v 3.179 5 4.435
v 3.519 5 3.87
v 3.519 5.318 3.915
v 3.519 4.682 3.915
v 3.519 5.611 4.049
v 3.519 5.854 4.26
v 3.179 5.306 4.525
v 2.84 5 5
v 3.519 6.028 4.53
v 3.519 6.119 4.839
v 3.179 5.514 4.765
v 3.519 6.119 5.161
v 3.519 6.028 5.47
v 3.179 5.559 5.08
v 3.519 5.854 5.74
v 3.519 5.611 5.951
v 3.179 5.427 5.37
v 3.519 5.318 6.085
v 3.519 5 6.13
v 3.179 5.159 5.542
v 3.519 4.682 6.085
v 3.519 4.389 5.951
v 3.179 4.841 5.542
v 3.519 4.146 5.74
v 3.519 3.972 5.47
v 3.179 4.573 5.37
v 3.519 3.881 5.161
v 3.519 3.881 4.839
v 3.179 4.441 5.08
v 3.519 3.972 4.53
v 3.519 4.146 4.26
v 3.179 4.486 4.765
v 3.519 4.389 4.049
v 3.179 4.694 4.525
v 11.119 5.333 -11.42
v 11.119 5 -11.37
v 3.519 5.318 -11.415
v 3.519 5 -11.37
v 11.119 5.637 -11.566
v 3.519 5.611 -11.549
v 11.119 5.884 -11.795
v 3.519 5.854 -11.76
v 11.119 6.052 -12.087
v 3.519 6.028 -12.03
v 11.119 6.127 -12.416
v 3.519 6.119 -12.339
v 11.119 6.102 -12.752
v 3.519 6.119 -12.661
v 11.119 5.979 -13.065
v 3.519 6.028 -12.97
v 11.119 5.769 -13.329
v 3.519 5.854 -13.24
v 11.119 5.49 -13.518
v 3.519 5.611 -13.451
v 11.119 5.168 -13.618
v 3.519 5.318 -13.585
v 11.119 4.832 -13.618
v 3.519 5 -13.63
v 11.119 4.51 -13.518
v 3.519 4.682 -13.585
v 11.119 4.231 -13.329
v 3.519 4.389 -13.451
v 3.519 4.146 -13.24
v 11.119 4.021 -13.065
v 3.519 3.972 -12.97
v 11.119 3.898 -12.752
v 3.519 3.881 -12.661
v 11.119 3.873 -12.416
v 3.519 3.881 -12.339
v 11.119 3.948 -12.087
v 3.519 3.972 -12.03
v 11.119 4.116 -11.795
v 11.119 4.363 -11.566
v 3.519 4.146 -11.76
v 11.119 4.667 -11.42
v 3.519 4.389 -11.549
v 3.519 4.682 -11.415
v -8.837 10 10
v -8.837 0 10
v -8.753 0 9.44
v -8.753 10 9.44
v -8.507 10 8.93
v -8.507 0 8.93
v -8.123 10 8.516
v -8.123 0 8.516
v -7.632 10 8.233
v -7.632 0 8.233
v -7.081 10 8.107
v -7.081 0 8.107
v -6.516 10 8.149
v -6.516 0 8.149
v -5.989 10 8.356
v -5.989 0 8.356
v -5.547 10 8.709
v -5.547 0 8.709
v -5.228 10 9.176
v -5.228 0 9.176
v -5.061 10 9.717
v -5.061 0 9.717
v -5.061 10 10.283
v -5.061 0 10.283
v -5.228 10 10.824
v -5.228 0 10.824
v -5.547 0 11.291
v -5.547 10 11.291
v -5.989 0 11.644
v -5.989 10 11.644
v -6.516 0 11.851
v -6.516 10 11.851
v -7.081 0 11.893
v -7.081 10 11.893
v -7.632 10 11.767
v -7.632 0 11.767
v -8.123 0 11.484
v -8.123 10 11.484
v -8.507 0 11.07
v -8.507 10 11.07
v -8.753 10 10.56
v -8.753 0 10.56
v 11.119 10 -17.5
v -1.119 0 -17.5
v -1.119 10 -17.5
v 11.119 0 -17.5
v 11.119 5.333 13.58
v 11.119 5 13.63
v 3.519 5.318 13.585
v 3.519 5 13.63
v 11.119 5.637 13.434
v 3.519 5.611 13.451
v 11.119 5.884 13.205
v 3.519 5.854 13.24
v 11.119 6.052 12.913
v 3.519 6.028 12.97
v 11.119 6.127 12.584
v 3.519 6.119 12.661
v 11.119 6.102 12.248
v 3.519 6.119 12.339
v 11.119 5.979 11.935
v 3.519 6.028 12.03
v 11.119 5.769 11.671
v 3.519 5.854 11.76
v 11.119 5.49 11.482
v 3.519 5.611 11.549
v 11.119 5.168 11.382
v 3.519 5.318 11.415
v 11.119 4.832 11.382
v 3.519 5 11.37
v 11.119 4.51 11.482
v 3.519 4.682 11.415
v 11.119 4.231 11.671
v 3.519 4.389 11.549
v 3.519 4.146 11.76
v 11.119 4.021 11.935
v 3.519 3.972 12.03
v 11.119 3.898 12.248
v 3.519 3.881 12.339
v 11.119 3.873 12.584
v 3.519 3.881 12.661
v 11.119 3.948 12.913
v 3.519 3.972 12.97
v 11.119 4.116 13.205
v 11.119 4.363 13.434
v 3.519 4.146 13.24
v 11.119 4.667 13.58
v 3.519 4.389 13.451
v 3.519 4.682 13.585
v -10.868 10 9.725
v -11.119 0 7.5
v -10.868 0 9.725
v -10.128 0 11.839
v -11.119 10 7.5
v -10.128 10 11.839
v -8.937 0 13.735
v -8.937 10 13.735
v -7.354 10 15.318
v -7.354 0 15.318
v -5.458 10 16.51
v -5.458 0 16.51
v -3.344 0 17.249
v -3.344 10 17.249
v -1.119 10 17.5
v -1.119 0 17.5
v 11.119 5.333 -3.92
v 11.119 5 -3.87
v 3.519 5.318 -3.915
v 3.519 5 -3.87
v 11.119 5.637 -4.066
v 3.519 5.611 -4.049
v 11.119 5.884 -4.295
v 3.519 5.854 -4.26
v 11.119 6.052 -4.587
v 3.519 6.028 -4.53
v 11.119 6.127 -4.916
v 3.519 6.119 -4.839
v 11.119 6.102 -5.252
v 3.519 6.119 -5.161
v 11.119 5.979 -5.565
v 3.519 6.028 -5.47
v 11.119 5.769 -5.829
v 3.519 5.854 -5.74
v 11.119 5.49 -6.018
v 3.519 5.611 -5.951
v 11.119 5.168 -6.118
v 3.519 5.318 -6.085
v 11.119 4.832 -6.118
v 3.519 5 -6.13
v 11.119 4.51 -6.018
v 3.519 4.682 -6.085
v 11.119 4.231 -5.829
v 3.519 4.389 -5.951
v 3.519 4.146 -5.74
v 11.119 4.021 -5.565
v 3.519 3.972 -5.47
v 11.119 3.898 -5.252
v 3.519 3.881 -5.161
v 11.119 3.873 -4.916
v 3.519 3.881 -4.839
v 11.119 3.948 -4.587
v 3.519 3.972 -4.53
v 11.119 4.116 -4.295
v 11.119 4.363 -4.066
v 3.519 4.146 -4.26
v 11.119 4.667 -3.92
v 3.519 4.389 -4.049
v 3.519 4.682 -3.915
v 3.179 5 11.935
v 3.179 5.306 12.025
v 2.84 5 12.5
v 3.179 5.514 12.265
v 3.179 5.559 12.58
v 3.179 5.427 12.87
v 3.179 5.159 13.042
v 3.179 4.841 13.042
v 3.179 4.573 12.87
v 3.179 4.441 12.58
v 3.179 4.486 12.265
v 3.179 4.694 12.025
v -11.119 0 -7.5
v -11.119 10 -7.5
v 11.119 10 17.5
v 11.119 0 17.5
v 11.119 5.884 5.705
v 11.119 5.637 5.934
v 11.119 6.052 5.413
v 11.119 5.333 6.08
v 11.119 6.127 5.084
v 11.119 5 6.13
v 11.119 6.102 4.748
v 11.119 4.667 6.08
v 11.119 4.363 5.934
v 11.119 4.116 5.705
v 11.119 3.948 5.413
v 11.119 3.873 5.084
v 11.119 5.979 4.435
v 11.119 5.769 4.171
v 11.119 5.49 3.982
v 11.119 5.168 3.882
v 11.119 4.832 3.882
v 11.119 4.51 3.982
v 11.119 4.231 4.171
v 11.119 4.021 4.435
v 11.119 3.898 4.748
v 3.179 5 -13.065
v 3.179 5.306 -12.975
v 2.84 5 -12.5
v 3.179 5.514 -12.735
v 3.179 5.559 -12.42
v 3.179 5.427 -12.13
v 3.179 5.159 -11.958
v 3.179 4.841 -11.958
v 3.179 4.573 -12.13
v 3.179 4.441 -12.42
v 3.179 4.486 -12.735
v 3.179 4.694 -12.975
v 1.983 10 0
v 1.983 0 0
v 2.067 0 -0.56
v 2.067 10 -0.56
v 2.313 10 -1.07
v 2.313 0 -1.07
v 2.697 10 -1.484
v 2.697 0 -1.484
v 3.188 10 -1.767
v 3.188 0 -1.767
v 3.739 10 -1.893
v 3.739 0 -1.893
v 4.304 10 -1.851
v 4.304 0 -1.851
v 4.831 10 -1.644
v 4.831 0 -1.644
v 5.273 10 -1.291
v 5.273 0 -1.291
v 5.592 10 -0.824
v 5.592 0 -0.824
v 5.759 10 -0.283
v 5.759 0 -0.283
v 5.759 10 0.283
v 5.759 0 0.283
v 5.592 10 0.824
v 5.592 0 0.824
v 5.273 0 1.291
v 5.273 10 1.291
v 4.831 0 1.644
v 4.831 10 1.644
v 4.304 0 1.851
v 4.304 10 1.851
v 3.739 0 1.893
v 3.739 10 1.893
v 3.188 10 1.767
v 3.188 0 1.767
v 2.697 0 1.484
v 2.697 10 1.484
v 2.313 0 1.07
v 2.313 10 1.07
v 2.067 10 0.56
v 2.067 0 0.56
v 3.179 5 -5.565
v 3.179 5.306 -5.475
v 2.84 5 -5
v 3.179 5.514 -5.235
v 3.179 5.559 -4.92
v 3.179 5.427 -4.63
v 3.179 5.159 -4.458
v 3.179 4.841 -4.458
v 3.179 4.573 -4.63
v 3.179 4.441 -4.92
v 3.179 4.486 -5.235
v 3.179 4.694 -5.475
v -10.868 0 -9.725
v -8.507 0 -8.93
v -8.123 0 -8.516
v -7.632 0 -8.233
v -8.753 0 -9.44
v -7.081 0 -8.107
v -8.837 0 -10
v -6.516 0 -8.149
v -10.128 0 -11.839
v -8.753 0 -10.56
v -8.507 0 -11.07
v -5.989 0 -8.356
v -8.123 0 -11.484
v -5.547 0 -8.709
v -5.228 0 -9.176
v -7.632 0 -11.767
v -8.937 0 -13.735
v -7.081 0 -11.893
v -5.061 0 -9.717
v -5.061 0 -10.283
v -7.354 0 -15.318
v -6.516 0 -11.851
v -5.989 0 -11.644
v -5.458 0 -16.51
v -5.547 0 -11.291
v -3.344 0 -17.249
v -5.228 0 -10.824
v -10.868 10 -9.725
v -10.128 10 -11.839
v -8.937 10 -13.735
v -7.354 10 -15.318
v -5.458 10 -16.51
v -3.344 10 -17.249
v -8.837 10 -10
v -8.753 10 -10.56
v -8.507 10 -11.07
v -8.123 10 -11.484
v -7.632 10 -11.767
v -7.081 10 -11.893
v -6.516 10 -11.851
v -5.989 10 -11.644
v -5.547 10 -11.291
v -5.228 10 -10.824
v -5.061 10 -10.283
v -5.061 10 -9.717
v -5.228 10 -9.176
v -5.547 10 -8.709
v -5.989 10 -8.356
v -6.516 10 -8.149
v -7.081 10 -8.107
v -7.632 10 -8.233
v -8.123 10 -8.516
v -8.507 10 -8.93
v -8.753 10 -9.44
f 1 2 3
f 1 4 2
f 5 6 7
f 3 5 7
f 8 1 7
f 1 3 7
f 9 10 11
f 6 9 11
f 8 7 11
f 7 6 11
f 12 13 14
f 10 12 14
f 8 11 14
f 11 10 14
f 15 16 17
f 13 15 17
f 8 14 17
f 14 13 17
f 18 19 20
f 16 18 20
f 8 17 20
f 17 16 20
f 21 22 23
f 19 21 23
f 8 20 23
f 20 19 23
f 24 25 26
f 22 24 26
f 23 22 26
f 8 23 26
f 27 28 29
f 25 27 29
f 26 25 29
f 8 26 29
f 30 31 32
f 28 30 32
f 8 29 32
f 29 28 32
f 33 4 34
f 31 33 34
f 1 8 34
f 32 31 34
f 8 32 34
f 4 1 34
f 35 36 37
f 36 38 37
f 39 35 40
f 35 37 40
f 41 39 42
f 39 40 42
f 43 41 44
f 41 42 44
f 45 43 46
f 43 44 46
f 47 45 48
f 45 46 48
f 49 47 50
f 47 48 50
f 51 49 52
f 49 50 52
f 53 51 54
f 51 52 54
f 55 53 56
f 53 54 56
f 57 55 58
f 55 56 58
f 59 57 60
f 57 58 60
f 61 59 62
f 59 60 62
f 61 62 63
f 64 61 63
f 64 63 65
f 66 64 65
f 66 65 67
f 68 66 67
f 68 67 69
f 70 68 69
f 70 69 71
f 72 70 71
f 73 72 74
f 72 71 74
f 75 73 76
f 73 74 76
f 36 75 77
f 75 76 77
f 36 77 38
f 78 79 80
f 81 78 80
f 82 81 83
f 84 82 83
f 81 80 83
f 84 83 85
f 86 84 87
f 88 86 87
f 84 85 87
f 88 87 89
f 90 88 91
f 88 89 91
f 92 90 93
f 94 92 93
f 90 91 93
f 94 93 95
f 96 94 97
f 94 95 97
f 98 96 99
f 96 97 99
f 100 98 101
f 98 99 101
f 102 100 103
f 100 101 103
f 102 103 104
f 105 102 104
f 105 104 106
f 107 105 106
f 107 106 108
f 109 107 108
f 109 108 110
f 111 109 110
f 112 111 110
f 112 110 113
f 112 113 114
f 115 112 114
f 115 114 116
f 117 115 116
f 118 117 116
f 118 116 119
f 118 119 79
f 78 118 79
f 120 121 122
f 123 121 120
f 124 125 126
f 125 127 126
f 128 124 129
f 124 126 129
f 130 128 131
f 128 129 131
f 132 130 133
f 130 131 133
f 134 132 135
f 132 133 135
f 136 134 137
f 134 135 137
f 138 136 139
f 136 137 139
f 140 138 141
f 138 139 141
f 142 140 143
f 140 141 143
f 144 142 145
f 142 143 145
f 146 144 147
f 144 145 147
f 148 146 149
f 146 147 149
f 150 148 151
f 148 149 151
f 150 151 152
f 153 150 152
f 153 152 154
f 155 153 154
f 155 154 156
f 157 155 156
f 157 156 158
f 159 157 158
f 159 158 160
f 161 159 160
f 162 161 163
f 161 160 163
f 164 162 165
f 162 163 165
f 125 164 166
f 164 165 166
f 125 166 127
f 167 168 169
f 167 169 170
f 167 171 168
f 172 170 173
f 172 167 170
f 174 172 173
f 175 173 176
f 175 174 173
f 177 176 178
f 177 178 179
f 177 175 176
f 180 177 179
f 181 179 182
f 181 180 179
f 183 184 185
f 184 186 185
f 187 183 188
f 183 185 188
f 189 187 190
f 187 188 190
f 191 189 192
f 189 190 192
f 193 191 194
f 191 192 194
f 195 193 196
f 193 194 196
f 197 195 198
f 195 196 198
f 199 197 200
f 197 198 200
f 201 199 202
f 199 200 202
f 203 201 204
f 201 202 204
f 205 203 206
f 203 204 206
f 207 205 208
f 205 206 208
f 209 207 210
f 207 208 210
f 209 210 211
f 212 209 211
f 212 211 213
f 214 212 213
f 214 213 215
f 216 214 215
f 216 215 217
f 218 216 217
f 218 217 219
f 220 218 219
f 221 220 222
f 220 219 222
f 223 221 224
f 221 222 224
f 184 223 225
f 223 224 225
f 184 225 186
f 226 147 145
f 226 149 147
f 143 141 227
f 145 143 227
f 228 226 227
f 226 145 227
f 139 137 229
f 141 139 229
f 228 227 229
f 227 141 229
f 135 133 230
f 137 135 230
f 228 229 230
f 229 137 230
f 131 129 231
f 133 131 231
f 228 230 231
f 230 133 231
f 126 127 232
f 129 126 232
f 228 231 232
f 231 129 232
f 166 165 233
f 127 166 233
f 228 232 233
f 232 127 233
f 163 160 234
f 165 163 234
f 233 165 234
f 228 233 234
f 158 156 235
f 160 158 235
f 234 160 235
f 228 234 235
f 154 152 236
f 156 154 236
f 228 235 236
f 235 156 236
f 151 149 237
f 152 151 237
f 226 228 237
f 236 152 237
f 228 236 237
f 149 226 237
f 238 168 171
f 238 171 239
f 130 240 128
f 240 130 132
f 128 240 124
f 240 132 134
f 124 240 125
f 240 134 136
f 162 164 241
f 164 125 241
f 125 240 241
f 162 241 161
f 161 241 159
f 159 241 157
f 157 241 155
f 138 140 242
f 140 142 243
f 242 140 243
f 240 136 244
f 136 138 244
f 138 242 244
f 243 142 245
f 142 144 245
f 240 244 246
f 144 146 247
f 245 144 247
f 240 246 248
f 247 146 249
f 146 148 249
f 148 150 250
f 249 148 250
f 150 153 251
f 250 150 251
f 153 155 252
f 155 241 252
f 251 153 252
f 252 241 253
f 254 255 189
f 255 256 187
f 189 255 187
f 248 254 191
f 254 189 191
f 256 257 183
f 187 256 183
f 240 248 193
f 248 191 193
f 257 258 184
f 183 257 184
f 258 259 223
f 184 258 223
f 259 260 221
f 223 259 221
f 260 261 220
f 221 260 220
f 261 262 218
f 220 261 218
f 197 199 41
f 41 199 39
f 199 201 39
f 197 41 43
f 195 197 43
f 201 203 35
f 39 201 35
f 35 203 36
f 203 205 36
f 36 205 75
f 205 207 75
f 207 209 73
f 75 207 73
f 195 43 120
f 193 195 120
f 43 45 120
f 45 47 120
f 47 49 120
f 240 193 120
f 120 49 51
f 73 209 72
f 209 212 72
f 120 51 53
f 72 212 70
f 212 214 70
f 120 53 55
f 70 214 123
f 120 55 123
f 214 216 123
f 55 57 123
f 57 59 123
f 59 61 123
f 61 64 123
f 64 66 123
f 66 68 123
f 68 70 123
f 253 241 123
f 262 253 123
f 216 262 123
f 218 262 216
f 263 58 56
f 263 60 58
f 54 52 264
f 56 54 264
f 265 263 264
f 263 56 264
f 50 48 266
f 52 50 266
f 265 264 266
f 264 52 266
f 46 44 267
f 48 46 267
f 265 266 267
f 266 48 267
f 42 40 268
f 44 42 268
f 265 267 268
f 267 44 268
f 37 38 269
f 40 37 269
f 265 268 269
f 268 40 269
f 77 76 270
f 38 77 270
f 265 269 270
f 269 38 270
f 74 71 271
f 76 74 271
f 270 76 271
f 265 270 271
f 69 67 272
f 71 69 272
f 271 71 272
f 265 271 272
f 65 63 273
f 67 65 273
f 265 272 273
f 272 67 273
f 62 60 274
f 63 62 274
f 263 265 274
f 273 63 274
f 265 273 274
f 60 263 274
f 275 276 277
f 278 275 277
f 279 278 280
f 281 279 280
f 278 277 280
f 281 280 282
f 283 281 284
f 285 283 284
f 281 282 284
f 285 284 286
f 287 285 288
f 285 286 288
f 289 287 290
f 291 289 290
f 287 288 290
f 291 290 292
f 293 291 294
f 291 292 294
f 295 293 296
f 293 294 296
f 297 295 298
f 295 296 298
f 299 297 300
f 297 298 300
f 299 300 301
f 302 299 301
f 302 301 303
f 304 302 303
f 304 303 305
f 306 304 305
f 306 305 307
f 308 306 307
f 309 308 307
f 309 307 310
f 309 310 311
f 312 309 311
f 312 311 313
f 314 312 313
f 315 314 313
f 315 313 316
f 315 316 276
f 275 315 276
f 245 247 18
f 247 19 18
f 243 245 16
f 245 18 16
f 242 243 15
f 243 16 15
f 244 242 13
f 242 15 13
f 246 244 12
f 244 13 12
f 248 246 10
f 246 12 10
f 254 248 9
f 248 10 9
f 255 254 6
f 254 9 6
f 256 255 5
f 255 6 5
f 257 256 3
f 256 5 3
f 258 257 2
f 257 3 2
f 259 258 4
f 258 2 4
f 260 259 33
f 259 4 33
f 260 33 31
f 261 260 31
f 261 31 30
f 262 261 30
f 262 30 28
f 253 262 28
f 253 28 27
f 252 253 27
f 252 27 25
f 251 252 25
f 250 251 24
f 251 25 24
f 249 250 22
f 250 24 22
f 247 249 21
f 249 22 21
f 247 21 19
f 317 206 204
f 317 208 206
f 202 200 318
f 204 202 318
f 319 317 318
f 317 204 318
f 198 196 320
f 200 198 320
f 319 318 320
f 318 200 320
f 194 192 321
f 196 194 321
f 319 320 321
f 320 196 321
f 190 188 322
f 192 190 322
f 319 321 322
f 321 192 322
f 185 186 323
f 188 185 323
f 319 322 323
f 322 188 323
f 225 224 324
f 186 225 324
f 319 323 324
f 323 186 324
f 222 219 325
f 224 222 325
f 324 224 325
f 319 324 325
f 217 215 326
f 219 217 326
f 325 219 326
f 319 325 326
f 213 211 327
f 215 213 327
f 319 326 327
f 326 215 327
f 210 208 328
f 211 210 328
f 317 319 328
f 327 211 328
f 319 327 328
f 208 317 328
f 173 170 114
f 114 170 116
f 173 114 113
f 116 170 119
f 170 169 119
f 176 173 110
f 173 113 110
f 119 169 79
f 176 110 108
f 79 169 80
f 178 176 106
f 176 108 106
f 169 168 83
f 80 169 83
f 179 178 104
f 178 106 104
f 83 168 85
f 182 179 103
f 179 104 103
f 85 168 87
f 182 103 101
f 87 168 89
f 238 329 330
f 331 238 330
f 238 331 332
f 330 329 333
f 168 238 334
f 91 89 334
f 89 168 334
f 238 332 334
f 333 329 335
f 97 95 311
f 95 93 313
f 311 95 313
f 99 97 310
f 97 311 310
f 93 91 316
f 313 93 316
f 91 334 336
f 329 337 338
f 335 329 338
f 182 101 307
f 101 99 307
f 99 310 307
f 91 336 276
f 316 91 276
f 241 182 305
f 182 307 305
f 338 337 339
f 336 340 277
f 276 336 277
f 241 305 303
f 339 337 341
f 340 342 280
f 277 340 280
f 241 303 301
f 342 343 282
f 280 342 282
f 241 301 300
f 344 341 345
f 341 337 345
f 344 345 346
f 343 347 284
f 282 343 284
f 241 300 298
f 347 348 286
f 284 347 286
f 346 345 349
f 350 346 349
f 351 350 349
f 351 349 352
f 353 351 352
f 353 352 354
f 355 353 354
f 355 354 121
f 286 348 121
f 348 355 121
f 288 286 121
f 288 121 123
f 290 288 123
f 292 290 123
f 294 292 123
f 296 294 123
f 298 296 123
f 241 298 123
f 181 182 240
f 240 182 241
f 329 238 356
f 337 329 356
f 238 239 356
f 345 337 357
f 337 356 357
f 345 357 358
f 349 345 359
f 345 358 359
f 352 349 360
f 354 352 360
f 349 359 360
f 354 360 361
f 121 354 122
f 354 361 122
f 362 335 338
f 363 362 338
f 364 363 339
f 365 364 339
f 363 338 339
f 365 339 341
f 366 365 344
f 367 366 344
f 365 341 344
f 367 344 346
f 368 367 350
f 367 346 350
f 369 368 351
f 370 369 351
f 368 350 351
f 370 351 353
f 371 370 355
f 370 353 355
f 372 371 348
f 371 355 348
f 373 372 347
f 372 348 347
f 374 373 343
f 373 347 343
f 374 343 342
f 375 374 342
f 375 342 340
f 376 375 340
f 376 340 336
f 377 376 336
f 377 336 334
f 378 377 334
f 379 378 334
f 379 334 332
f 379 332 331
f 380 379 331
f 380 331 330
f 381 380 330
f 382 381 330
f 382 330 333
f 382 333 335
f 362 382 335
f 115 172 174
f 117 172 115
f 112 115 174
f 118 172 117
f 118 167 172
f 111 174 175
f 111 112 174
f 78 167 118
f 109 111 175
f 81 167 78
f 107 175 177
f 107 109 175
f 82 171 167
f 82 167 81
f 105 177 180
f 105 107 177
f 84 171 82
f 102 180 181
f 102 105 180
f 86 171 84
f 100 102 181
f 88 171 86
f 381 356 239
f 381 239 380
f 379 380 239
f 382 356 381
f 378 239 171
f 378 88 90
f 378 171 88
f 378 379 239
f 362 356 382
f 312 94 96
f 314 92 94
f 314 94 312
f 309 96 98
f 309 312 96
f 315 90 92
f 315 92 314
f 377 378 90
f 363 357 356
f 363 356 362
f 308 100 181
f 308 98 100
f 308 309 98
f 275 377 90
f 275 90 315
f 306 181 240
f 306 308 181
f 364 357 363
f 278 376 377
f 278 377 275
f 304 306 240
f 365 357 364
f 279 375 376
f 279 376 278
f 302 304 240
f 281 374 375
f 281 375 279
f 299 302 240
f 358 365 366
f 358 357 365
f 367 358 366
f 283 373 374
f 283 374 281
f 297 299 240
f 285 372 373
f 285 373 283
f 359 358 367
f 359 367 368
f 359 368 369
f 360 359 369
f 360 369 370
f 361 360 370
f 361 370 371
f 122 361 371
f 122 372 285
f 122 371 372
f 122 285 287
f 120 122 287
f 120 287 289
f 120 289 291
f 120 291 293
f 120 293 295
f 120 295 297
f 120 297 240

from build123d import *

# Parameters (mm, degrees)
SKETCH1_W                 = 22.2375
SKETCH1_H                 = 35
BOSS_EXTRUDE1_DEPTH       = 10
F_4_40_TAPPED_HOLE1_D     = 2.2606
F_4_40_TAPPED_HOLE1_DEPTH = 7.6
F_4_40_TAPPED_HOLE1_TIP   = 0.679152758
F_6_CLEARANCE_HOLE1_D     = 3.7973
FILLET1_R                 = 10


with BuildPart() as part:
    # Sketch1 → Boss-Extrude1 (new body)
    with BuildSketch(Plane(origin=(0, 0, 0), x_dir=(1, 0, 0), z_dir=(0, 1, 0))):
        Rectangle(SKETCH1_W, SKETCH1_H)
    extrude(amount=BOSS_EXTRUDE1_DEPTH)

    # #4-40 Tapped Hole1
    with Locations(Plane(origin=(11.11875, 0, 0), x_dir=(0, 0, -1), z_dir=(1, 0, 0))):
        with Locations((-12.5, 5), (12.5, 5), (-5, 5), (5, 5)):
            Hole(F_4_40_TAPPED_HOLE1_D / 2, depth=F_4_40_TAPPED_HOLE1_DEPTH)
            with Locations((0, 0, -(F_4_40_TAPPED_HOLE1_DEPTH + F_4_40_TAPPED_HOLE1_TIP / 2))):  # 118° drill point
                Cone(0, F_4_40_TAPPED_HOLE1_D / 2, F_4_40_TAPPED_HOLE1_TIP, mode=Mode.SUBTRACT)

    # #6 Clearance Hole1 (through all)
    with Locations(Plane(origin=(0, 10, 0), x_dir=(1, 0, 0), z_dir=(0, 1, 0))):
        with Locations((3.88125, 0), (-6.93875, 10), (-6.93875, -10)):
            Hole(F_6_CLEARANCE_HOLE1_D / 2)

    # Fillet1
    fillet1_edges = [part.edges().sort_by_distance(p)[0] for p in [
        (-11.11875, 5, 17.5),
        (-11.11875, 5, -17.5),
    ]]
    fillet(fillet1_edges, radius=FILLET1_R)


solid = part.part
